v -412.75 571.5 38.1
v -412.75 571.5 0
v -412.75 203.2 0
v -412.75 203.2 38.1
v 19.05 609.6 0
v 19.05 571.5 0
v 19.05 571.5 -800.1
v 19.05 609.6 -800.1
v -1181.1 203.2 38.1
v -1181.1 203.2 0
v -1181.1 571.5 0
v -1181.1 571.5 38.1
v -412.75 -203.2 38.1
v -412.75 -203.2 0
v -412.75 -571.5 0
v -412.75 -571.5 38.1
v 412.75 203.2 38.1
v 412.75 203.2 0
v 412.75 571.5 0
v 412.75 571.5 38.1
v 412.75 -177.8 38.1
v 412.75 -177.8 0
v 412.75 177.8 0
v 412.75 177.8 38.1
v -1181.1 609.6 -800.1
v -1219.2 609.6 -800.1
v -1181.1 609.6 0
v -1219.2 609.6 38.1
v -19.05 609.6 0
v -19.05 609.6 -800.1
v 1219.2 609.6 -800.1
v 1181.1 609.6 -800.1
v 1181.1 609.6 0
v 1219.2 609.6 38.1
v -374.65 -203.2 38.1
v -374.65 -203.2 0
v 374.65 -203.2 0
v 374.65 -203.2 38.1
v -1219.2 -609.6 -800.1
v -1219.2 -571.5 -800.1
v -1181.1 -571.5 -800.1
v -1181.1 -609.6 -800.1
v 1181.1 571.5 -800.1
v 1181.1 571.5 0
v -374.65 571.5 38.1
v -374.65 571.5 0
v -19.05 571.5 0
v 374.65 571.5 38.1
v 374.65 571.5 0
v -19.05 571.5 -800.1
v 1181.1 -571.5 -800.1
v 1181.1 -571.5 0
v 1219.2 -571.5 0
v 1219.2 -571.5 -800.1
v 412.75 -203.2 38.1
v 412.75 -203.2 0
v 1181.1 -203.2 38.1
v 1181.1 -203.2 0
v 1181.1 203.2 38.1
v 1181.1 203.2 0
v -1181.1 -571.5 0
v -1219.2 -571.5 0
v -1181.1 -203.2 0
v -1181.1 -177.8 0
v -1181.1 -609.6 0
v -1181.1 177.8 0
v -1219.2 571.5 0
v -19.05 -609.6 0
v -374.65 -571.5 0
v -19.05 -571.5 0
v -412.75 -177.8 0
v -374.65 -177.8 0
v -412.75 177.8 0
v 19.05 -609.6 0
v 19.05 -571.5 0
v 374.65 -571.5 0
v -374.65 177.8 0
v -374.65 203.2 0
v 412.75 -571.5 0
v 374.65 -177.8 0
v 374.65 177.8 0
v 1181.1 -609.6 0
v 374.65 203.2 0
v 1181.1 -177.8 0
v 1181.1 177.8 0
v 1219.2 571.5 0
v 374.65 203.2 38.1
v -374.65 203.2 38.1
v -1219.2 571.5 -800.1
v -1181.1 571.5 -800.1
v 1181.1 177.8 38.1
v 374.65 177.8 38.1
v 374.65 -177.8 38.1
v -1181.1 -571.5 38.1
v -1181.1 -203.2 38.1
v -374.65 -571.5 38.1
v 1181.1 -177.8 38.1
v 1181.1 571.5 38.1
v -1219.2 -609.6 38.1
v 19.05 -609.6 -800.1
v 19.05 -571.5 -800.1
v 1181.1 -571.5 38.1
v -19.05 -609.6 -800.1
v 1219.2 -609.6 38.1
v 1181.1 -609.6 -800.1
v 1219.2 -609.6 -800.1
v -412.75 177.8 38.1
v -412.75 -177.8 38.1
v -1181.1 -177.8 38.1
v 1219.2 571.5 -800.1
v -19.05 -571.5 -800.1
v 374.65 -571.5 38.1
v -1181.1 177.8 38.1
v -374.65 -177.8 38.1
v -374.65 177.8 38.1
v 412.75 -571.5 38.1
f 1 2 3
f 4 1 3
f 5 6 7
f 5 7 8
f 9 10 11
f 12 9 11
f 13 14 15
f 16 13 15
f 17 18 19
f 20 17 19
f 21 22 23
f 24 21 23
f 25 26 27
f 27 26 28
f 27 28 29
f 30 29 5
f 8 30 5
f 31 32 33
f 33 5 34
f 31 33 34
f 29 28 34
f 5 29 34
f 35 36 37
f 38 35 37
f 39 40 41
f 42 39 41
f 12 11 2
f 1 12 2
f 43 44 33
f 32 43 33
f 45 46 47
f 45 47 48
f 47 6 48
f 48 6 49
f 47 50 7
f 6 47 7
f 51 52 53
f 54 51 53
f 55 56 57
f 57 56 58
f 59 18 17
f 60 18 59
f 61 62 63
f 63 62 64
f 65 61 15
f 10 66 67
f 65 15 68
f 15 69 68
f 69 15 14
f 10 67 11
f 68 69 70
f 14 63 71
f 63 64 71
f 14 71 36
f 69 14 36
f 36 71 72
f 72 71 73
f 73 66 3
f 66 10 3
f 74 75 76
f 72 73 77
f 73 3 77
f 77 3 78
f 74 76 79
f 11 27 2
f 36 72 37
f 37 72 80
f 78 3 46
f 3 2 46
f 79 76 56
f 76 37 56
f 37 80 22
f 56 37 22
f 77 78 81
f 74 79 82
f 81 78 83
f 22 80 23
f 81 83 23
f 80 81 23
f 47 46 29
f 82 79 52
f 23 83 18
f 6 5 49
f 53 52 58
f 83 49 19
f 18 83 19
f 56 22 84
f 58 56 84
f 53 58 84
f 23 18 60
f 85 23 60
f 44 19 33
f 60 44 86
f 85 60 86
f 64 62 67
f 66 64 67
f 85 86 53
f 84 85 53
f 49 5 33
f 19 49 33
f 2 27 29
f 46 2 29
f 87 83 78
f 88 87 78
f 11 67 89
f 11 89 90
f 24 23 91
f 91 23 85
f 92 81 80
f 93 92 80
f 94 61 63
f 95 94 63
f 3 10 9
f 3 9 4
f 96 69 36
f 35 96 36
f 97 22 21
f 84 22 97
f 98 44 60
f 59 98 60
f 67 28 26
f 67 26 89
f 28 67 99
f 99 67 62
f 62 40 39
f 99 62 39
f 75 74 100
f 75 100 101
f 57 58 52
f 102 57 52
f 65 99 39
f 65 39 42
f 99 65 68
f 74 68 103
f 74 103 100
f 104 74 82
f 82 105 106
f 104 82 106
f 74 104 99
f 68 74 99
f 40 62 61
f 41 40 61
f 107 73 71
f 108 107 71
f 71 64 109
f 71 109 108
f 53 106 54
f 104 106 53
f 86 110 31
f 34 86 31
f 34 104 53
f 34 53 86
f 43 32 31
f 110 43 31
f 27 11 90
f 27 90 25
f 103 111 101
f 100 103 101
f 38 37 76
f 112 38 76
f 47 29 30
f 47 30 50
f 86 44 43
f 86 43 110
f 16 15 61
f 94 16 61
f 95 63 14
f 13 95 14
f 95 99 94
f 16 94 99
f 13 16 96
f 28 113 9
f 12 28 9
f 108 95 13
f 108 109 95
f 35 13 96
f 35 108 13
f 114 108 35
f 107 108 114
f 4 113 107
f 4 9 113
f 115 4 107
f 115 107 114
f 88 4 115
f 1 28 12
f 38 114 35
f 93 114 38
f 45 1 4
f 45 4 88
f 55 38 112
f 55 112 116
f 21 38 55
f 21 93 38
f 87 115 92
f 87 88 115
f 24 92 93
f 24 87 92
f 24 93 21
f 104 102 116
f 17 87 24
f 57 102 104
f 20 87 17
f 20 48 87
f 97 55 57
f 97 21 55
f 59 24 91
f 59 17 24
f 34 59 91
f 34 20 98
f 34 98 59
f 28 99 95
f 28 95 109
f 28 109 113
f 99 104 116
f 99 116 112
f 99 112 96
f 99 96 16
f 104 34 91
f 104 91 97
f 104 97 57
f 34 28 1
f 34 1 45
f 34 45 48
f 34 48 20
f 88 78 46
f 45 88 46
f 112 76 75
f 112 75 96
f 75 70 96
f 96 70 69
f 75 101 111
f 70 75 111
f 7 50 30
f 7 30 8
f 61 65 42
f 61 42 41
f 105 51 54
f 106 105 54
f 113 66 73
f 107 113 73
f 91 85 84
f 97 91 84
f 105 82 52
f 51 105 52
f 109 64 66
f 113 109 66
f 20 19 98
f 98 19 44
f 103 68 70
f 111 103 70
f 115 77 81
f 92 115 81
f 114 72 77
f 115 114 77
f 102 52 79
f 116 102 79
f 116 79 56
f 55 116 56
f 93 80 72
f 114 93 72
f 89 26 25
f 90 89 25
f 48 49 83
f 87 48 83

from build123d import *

# Parameters (mm, degrees)
F0_W     = 38.1
F0_H     = 38.1
F0_H_2   = 368.3
F0_H_3   = 25.4
F1_DEPTH = 38.1
F2_DEPTH = 800.1
F0_W_2   = 768.35
F3_DEPTH = 38.1


with BuildPart() as f1:
    # F0 (on Top) → F1 (new body)
    with BuildSketch(Plane.XY):
        with Locations((1200.15, 590.55)):
            Rectangle(F0_W, F0_H)
        Polygon((1181.1, 571.5), (1181.1, 609.6), (19.05, 609.6), (19.05, 571.5), (374.65, 571.5), (412.75, 571.5), align=None)
        Polygon((1219.2, -571.5), (1219.2, 571.5), (1181.1, 571.5), (1181.1, 203.2), (1181.1, 177.8), (1181.1, 0), (1181.1, -177.8), (1181.1, -203.2), (1181.1, -571.5), align=None)
        Polygon((19.05, 571.5), (19.05, 609.6), (-19.05, 609.6), (-19.05, 571.5), (0, 571.5), align=None)
        with Locations((1200.15, -590.55)):
            Rectangle(F0_W, F0_H)
        Polygon((-19.05, 571.5), (-19.05, 609.6), (-1181.1, 609.6), (-1181.1, 571.5), (-412.75, 571.5), (-374.65, 571.5), align=None)
        Polygon((1181.1, -609.6), (1181.1, -571.5), (412.75, -571.5), (374.65, -571.5), (19.05, -571.5), (19.05, -609.6), align=None)
        with Locations((-1200.15, 590.55)):
            Rectangle(F0_W, F0_H)
        Polygon((-1181.1, 203.2), (-1181.1, 571.5), (-1219.2, 571.5), (-1219.2, -571.5), (-1181.1, -571.5), (-1181.1, -203.2), (-1181.1, -177.8), (-1181.1, 0), (-1181.1, 177.8), align=None)
        with Locations((0, -590.55)):
            Rectangle(F0_W, F0_H)
        Polygon((-1181.1, -609.6), (-19.05, -609.6), (-19.05, -571.5), (-374.65, -571.5), (-412.75, -571.5), (-1181.1, -571.5), align=None)
        with Locations((-1200.15, -590.55)):
            Rectangle(F0_W, F0_H)
        with Locations((-393.7, 387.35)):
            Rectangle(F0_W, F0_H_2)
        with Locations((-393.7, -387.35)):
            Rectangle(F0_W, F0_H_2)
        with Locations((393.7, 387.35)):
            Rectangle(F0_W, F0_H_2)
        with Locations((393.7, -387.35)):
            Rectangle(F0_W, F0_H_2)
        Polygon((412.75, -177.8), (412.75, 0), (393.7, 0), (374.65, 0), (374.65, -177.8), align=None)
        Polygon((412.75, 0), (412.75, 177.8), (374.65, 177.8), (374.65, 0), (393.7, 0), align=None)
        with Locations((393.7, -190.5)):
            Rectangle(F0_W, F0_H_3)
        with Locations((393.7, 190.5)):
            Rectangle(F0_W, F0_H_3)
        with Locations((-393.7, -190.5)):
            Rectangle(F0_W, F0_H_3)
        Polygon((-374.65, -177.8), (-374.65, 0), (-393.7, 0), (-412.75, 0), (-412.75, -177.8), align=None)
        Polygon((-374.65, 0), (-374.65, 177.8), (-412.75, 177.8), (-412.75, 0), (-393.7, 0), align=None)
        with Locations((-393.7, 190.5)):
            Rectangle(F0_W, F0_H_3)
    extrude(amount=F1_DEPTH)

    # F0 (on Top) → F2 (join)
    with BuildSketch(Plane.XY):
        with Locations((1200.15, 590.55)):
            Rectangle(F0_W, F0_H)
        with Locations((1200.15, -590.55)):
            Rectangle(F0_W, F0_H)
        with Locations((0, -590.55)):
            Rectangle(F0_W, F0_H)
        Polygon((19.05, 571.5), (19.05, 609.6), (-19.05, 609.6), (-19.05, 571.5), (0, 571.5), align=None)
        with Locations((-1200.15, 590.55)):
            Rectangle(F0_W, F0_H)
        with Locations((-1200.15, -590.55)):
            Rectangle(F0_W, F0_H)
    extrude(amount=-F2_DEPTH)

    # F0 (on Top) → F3 (join)
    with BuildSketch(Plane.XY):
        Polygon((-374.65, -203.2), (374.65, -203.2), (374.65, -177.8), (0, -177.8), (-374.65, -177.8), align=None)
        Polygon((374.65, 177.8), (374.65, 203.2), (0, 203.2), (0, 190.5), (0, 177.8), align=None)
        with Locations((-796.925, 190.5)):
            Rectangle(F0_W_2, F0_H_3)
        Polygon((0, 190.5), (0, 203.2), (-374.65, 203.2), (-374.65, 177.8), (0, 177.8), align=None)
        with Locations((-796.925, -190.5)):
            Rectangle(F0_W_2, F0_H_3)
        with Locations((796.925, -190.5)):
            Rectangle(F0_W_2, F0_H_3)
        with Locations((796.925, 190.5)):
            Rectangle(F0_W_2, F0_H_3)
    extrude(amount=F3_DEPTH)


solid = f1.part
